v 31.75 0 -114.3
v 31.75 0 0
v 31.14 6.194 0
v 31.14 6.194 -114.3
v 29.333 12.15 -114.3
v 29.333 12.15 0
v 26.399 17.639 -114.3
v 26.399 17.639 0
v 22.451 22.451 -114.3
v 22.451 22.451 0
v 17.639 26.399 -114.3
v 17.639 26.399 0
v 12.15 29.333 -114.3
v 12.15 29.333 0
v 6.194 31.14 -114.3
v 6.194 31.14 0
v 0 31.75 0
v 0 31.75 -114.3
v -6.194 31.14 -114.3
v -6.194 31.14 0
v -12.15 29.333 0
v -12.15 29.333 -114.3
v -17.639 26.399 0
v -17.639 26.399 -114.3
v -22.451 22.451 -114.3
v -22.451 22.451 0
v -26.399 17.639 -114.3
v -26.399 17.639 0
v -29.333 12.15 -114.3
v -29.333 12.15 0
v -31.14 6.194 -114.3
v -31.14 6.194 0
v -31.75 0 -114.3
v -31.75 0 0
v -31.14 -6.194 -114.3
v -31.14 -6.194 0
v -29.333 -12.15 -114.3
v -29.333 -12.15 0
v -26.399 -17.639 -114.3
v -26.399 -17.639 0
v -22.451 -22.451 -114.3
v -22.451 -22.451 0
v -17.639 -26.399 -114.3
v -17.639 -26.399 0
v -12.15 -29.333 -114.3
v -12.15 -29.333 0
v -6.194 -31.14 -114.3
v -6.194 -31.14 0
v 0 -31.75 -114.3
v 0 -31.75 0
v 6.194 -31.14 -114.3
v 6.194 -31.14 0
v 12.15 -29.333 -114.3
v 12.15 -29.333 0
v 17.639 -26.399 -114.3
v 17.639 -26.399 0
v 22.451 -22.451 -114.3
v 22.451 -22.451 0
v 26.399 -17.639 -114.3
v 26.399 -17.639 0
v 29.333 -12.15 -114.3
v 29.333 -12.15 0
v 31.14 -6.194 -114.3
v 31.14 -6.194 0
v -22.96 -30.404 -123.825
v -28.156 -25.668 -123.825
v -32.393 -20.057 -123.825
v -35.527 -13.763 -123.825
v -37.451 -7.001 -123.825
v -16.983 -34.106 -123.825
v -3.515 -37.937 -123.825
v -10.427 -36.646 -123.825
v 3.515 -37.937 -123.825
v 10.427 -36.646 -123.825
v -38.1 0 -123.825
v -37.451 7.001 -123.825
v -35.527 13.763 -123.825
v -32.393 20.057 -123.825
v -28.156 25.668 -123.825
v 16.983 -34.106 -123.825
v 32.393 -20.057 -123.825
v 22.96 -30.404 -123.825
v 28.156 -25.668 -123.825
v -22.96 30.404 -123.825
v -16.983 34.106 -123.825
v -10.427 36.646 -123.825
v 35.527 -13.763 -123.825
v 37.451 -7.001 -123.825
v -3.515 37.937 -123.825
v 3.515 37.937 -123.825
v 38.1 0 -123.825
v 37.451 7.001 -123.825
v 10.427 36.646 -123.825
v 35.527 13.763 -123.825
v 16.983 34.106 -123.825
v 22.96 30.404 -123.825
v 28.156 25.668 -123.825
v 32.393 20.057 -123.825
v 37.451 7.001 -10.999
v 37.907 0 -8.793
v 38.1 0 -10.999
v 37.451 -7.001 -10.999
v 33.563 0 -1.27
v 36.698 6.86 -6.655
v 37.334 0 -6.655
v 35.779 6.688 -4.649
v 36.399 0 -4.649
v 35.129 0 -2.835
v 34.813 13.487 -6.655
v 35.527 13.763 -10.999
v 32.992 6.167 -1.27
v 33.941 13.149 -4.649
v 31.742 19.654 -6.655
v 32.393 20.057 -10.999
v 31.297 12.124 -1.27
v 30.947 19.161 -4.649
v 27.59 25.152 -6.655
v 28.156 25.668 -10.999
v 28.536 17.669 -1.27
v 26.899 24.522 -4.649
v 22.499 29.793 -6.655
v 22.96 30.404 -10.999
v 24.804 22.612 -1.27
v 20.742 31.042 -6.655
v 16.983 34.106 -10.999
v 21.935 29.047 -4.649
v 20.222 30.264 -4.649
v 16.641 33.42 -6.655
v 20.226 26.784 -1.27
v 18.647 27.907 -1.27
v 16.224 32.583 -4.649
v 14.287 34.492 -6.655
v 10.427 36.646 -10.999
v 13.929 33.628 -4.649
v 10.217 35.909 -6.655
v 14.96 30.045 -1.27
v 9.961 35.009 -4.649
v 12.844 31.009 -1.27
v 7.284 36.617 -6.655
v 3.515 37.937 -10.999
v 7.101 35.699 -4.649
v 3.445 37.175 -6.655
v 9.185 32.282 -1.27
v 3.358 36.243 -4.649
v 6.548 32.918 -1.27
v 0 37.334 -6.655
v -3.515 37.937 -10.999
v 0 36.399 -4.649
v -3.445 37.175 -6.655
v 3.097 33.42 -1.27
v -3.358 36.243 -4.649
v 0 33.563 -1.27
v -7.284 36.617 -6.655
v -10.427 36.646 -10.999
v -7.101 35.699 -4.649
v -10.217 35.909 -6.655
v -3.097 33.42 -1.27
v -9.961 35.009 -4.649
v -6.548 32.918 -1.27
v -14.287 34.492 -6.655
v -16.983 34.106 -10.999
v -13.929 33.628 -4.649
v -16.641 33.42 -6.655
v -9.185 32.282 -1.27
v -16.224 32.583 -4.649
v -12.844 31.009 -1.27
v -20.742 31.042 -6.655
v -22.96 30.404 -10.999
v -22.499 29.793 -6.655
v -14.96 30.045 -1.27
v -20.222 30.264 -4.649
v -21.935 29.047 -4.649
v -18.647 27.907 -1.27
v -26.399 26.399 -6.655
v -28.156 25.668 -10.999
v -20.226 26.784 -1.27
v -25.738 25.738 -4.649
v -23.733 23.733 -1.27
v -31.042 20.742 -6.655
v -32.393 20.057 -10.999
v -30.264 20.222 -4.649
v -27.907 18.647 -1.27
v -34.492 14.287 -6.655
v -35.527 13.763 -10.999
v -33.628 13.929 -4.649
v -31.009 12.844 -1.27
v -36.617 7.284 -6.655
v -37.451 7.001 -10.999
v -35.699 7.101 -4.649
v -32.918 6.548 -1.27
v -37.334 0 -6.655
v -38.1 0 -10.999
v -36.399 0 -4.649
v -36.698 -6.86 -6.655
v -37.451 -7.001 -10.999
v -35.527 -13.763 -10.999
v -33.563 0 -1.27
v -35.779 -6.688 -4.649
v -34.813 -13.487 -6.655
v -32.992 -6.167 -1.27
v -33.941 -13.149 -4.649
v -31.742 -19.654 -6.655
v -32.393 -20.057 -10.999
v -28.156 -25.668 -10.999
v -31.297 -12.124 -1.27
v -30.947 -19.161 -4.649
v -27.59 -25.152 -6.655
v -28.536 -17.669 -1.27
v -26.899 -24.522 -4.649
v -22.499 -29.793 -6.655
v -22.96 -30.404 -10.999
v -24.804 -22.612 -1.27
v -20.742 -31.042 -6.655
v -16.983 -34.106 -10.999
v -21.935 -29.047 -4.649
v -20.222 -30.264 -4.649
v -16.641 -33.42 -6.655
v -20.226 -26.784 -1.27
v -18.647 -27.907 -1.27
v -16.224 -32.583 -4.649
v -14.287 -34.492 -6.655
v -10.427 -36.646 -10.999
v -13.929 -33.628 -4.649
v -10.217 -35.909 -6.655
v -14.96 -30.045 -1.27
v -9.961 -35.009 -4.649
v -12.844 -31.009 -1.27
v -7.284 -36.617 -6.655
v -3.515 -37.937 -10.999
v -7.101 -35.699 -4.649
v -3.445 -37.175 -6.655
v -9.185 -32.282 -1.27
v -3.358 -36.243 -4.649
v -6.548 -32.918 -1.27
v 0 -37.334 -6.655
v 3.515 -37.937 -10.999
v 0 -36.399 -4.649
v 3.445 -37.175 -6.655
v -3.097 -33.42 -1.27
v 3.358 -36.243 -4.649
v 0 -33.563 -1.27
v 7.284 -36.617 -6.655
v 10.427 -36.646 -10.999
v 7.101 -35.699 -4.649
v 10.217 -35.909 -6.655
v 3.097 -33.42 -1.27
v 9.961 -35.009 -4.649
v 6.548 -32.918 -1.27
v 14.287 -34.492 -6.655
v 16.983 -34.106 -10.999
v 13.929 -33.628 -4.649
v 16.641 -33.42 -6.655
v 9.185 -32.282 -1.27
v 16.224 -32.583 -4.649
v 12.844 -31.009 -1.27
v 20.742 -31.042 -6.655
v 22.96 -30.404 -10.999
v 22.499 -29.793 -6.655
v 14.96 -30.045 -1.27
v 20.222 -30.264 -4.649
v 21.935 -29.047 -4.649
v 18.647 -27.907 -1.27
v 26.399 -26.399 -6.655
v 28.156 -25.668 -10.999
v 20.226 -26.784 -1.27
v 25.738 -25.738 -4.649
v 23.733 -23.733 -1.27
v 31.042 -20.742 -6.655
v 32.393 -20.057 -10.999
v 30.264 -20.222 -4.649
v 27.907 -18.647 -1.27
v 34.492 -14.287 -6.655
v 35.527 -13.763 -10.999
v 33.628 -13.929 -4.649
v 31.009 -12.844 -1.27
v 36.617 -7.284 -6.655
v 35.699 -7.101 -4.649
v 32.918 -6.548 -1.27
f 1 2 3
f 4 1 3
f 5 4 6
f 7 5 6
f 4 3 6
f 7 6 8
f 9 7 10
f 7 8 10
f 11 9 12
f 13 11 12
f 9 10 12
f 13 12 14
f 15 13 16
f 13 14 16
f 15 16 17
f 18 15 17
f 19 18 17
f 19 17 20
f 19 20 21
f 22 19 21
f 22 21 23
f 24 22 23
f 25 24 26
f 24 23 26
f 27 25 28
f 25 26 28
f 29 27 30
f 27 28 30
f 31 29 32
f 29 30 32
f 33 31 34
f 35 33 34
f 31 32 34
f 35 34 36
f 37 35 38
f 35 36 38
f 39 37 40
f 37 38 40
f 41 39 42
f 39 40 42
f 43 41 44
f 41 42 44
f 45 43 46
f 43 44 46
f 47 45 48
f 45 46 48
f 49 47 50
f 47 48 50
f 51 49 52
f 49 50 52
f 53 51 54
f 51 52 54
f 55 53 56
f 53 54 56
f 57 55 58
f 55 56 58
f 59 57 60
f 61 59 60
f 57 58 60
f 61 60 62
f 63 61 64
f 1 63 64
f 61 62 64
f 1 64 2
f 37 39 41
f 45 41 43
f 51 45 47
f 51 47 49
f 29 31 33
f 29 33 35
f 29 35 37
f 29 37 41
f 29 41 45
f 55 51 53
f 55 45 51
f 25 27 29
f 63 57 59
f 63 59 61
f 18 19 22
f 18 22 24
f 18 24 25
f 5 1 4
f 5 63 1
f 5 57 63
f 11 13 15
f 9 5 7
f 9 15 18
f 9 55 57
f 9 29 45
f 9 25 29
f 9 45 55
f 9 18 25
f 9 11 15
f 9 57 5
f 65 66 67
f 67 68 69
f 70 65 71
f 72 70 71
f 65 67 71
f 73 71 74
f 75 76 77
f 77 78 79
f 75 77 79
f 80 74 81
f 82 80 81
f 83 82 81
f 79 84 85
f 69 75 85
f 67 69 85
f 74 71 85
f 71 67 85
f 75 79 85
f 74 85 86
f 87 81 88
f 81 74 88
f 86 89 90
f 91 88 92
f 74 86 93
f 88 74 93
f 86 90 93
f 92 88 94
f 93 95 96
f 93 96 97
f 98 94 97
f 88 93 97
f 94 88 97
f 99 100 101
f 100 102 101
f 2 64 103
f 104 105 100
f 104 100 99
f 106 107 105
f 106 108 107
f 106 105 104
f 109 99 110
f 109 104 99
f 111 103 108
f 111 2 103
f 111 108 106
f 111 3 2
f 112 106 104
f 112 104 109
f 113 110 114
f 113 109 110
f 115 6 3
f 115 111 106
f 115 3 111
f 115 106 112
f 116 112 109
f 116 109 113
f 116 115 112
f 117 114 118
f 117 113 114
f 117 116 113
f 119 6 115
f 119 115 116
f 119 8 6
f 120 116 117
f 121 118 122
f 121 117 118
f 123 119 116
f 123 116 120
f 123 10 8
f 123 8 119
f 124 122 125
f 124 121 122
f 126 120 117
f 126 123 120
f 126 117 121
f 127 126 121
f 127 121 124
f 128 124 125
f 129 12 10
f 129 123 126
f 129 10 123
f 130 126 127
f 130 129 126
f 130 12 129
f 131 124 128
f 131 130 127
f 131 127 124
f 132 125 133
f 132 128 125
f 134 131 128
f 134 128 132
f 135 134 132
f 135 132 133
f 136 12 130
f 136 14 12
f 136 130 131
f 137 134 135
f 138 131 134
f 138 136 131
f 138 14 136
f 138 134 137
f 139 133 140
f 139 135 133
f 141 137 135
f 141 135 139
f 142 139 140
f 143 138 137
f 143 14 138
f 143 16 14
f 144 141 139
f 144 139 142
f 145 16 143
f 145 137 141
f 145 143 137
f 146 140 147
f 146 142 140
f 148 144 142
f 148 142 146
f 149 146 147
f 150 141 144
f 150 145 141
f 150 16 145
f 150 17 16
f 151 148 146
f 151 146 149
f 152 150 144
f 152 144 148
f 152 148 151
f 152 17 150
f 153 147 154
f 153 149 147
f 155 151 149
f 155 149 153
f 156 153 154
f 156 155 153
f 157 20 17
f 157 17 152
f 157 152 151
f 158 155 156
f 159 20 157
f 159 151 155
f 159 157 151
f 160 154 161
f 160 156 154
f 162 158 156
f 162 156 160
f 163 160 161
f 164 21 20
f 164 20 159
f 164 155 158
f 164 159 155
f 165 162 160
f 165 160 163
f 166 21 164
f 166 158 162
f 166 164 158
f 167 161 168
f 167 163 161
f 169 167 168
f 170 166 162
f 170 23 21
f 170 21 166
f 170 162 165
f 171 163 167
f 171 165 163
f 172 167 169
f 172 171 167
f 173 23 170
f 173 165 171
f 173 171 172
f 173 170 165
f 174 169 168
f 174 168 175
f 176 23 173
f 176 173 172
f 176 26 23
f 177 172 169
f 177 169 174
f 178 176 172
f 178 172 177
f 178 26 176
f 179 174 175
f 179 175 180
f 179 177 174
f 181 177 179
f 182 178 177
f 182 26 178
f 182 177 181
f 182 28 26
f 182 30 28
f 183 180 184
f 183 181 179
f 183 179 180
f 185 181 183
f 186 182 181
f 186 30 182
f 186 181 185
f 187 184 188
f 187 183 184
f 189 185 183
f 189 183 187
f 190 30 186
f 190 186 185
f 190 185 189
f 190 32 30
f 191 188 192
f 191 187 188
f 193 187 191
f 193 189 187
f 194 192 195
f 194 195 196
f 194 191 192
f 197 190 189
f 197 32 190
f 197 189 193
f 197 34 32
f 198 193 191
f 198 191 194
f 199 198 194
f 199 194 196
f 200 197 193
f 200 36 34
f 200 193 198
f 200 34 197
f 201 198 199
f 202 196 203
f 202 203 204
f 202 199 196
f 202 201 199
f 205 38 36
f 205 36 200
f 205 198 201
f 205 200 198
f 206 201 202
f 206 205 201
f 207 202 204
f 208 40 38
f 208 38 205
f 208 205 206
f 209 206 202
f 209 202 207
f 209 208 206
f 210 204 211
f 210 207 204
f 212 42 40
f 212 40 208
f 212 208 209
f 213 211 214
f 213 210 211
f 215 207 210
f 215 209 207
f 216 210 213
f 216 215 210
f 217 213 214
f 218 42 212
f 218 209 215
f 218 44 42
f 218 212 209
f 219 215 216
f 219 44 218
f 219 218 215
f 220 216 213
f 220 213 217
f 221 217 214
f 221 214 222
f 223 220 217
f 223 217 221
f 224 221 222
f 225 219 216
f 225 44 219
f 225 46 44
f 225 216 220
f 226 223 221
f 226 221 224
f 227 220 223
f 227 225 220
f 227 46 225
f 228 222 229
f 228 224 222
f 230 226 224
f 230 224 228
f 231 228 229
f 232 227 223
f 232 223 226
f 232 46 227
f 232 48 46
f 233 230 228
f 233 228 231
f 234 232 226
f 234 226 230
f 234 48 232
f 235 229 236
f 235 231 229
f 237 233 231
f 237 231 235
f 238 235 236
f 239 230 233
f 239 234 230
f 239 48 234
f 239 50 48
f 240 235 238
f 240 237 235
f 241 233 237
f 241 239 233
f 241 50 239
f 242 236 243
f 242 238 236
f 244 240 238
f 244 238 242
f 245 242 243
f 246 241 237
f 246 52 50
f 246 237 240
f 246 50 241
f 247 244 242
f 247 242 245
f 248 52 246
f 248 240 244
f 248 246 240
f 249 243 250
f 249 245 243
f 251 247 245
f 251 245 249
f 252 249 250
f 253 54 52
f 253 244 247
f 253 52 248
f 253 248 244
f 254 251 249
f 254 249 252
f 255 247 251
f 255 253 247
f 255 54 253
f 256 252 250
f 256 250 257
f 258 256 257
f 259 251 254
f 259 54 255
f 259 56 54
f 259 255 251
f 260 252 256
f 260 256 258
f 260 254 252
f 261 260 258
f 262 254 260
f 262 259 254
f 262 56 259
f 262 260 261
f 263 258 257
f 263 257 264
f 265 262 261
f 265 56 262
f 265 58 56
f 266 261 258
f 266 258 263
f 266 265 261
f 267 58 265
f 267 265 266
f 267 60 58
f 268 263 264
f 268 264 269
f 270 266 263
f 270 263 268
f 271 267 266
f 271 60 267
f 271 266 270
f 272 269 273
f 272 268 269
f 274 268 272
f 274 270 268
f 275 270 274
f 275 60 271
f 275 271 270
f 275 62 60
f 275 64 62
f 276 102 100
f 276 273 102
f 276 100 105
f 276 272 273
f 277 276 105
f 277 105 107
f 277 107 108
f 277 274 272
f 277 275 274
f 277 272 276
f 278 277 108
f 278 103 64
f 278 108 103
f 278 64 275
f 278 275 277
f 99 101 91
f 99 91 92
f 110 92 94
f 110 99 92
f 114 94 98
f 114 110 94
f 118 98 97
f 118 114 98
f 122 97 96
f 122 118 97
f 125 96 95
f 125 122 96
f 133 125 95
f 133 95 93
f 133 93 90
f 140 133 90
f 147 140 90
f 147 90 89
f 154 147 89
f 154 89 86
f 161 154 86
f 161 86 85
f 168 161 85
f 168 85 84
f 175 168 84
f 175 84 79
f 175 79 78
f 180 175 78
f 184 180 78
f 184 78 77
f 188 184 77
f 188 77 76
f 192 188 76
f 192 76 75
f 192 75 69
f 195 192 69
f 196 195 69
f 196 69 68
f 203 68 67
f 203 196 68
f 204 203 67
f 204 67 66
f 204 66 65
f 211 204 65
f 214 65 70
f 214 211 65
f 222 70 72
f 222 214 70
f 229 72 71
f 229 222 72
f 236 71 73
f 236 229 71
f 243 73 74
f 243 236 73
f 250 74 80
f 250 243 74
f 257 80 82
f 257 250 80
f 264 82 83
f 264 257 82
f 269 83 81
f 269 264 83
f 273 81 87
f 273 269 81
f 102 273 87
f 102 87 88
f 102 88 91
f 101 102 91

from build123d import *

# Parameters (mm, degrees)
F0_R     = 38.1
F0_R_2   = 31.75
F1_DEPTH = 123.825
F2_DEPTH = 114.3


# Not quite as in the source:
# - a fillet or chamfer that OpenCascade refuses, or shapes differently, is made with other operations: its cross-section is extruded or revolved along the edge and cut away or added


with BuildPart() as f1:
    # F0 (on Top) → F1 (new body)
    with BuildSketch(Plane.XY):
        Circle(F0_R)
        Circle(F0_R_2, mode=Mode.SUBTRACT)
        Circle(F0_R_2)
    extrude(amount=-F1_DEPTH)

    # F0 (on Top) → F2 (cut)
    with BuildSketch(Plane.XY):
        Circle(F0_R_2)
    extrude(amount=-F2_DEPTH, mode=Mode.SUBTRACT)

    # F3: fillet of radius 12.7 on 1 edges, made by hand

    # F3_s1 → F3_t2 (revolve, cut)
    with BuildSketch(Plane.XZ):
        with BuildLine():
            ThreePointArc((38.1, -10.9985226281), (36.3985226281, -4.6485226281), (31.75, 0))
            Line((31.75, 0), (38.1, 0))
            Line((38.1, 0), (38.1, -10.9985226281))
        make_face()
    revolve(axis=Axis((0, 0, 0), (0, 0, 1)), mode=Mode.SUBTRACT)


solid = f1.part
